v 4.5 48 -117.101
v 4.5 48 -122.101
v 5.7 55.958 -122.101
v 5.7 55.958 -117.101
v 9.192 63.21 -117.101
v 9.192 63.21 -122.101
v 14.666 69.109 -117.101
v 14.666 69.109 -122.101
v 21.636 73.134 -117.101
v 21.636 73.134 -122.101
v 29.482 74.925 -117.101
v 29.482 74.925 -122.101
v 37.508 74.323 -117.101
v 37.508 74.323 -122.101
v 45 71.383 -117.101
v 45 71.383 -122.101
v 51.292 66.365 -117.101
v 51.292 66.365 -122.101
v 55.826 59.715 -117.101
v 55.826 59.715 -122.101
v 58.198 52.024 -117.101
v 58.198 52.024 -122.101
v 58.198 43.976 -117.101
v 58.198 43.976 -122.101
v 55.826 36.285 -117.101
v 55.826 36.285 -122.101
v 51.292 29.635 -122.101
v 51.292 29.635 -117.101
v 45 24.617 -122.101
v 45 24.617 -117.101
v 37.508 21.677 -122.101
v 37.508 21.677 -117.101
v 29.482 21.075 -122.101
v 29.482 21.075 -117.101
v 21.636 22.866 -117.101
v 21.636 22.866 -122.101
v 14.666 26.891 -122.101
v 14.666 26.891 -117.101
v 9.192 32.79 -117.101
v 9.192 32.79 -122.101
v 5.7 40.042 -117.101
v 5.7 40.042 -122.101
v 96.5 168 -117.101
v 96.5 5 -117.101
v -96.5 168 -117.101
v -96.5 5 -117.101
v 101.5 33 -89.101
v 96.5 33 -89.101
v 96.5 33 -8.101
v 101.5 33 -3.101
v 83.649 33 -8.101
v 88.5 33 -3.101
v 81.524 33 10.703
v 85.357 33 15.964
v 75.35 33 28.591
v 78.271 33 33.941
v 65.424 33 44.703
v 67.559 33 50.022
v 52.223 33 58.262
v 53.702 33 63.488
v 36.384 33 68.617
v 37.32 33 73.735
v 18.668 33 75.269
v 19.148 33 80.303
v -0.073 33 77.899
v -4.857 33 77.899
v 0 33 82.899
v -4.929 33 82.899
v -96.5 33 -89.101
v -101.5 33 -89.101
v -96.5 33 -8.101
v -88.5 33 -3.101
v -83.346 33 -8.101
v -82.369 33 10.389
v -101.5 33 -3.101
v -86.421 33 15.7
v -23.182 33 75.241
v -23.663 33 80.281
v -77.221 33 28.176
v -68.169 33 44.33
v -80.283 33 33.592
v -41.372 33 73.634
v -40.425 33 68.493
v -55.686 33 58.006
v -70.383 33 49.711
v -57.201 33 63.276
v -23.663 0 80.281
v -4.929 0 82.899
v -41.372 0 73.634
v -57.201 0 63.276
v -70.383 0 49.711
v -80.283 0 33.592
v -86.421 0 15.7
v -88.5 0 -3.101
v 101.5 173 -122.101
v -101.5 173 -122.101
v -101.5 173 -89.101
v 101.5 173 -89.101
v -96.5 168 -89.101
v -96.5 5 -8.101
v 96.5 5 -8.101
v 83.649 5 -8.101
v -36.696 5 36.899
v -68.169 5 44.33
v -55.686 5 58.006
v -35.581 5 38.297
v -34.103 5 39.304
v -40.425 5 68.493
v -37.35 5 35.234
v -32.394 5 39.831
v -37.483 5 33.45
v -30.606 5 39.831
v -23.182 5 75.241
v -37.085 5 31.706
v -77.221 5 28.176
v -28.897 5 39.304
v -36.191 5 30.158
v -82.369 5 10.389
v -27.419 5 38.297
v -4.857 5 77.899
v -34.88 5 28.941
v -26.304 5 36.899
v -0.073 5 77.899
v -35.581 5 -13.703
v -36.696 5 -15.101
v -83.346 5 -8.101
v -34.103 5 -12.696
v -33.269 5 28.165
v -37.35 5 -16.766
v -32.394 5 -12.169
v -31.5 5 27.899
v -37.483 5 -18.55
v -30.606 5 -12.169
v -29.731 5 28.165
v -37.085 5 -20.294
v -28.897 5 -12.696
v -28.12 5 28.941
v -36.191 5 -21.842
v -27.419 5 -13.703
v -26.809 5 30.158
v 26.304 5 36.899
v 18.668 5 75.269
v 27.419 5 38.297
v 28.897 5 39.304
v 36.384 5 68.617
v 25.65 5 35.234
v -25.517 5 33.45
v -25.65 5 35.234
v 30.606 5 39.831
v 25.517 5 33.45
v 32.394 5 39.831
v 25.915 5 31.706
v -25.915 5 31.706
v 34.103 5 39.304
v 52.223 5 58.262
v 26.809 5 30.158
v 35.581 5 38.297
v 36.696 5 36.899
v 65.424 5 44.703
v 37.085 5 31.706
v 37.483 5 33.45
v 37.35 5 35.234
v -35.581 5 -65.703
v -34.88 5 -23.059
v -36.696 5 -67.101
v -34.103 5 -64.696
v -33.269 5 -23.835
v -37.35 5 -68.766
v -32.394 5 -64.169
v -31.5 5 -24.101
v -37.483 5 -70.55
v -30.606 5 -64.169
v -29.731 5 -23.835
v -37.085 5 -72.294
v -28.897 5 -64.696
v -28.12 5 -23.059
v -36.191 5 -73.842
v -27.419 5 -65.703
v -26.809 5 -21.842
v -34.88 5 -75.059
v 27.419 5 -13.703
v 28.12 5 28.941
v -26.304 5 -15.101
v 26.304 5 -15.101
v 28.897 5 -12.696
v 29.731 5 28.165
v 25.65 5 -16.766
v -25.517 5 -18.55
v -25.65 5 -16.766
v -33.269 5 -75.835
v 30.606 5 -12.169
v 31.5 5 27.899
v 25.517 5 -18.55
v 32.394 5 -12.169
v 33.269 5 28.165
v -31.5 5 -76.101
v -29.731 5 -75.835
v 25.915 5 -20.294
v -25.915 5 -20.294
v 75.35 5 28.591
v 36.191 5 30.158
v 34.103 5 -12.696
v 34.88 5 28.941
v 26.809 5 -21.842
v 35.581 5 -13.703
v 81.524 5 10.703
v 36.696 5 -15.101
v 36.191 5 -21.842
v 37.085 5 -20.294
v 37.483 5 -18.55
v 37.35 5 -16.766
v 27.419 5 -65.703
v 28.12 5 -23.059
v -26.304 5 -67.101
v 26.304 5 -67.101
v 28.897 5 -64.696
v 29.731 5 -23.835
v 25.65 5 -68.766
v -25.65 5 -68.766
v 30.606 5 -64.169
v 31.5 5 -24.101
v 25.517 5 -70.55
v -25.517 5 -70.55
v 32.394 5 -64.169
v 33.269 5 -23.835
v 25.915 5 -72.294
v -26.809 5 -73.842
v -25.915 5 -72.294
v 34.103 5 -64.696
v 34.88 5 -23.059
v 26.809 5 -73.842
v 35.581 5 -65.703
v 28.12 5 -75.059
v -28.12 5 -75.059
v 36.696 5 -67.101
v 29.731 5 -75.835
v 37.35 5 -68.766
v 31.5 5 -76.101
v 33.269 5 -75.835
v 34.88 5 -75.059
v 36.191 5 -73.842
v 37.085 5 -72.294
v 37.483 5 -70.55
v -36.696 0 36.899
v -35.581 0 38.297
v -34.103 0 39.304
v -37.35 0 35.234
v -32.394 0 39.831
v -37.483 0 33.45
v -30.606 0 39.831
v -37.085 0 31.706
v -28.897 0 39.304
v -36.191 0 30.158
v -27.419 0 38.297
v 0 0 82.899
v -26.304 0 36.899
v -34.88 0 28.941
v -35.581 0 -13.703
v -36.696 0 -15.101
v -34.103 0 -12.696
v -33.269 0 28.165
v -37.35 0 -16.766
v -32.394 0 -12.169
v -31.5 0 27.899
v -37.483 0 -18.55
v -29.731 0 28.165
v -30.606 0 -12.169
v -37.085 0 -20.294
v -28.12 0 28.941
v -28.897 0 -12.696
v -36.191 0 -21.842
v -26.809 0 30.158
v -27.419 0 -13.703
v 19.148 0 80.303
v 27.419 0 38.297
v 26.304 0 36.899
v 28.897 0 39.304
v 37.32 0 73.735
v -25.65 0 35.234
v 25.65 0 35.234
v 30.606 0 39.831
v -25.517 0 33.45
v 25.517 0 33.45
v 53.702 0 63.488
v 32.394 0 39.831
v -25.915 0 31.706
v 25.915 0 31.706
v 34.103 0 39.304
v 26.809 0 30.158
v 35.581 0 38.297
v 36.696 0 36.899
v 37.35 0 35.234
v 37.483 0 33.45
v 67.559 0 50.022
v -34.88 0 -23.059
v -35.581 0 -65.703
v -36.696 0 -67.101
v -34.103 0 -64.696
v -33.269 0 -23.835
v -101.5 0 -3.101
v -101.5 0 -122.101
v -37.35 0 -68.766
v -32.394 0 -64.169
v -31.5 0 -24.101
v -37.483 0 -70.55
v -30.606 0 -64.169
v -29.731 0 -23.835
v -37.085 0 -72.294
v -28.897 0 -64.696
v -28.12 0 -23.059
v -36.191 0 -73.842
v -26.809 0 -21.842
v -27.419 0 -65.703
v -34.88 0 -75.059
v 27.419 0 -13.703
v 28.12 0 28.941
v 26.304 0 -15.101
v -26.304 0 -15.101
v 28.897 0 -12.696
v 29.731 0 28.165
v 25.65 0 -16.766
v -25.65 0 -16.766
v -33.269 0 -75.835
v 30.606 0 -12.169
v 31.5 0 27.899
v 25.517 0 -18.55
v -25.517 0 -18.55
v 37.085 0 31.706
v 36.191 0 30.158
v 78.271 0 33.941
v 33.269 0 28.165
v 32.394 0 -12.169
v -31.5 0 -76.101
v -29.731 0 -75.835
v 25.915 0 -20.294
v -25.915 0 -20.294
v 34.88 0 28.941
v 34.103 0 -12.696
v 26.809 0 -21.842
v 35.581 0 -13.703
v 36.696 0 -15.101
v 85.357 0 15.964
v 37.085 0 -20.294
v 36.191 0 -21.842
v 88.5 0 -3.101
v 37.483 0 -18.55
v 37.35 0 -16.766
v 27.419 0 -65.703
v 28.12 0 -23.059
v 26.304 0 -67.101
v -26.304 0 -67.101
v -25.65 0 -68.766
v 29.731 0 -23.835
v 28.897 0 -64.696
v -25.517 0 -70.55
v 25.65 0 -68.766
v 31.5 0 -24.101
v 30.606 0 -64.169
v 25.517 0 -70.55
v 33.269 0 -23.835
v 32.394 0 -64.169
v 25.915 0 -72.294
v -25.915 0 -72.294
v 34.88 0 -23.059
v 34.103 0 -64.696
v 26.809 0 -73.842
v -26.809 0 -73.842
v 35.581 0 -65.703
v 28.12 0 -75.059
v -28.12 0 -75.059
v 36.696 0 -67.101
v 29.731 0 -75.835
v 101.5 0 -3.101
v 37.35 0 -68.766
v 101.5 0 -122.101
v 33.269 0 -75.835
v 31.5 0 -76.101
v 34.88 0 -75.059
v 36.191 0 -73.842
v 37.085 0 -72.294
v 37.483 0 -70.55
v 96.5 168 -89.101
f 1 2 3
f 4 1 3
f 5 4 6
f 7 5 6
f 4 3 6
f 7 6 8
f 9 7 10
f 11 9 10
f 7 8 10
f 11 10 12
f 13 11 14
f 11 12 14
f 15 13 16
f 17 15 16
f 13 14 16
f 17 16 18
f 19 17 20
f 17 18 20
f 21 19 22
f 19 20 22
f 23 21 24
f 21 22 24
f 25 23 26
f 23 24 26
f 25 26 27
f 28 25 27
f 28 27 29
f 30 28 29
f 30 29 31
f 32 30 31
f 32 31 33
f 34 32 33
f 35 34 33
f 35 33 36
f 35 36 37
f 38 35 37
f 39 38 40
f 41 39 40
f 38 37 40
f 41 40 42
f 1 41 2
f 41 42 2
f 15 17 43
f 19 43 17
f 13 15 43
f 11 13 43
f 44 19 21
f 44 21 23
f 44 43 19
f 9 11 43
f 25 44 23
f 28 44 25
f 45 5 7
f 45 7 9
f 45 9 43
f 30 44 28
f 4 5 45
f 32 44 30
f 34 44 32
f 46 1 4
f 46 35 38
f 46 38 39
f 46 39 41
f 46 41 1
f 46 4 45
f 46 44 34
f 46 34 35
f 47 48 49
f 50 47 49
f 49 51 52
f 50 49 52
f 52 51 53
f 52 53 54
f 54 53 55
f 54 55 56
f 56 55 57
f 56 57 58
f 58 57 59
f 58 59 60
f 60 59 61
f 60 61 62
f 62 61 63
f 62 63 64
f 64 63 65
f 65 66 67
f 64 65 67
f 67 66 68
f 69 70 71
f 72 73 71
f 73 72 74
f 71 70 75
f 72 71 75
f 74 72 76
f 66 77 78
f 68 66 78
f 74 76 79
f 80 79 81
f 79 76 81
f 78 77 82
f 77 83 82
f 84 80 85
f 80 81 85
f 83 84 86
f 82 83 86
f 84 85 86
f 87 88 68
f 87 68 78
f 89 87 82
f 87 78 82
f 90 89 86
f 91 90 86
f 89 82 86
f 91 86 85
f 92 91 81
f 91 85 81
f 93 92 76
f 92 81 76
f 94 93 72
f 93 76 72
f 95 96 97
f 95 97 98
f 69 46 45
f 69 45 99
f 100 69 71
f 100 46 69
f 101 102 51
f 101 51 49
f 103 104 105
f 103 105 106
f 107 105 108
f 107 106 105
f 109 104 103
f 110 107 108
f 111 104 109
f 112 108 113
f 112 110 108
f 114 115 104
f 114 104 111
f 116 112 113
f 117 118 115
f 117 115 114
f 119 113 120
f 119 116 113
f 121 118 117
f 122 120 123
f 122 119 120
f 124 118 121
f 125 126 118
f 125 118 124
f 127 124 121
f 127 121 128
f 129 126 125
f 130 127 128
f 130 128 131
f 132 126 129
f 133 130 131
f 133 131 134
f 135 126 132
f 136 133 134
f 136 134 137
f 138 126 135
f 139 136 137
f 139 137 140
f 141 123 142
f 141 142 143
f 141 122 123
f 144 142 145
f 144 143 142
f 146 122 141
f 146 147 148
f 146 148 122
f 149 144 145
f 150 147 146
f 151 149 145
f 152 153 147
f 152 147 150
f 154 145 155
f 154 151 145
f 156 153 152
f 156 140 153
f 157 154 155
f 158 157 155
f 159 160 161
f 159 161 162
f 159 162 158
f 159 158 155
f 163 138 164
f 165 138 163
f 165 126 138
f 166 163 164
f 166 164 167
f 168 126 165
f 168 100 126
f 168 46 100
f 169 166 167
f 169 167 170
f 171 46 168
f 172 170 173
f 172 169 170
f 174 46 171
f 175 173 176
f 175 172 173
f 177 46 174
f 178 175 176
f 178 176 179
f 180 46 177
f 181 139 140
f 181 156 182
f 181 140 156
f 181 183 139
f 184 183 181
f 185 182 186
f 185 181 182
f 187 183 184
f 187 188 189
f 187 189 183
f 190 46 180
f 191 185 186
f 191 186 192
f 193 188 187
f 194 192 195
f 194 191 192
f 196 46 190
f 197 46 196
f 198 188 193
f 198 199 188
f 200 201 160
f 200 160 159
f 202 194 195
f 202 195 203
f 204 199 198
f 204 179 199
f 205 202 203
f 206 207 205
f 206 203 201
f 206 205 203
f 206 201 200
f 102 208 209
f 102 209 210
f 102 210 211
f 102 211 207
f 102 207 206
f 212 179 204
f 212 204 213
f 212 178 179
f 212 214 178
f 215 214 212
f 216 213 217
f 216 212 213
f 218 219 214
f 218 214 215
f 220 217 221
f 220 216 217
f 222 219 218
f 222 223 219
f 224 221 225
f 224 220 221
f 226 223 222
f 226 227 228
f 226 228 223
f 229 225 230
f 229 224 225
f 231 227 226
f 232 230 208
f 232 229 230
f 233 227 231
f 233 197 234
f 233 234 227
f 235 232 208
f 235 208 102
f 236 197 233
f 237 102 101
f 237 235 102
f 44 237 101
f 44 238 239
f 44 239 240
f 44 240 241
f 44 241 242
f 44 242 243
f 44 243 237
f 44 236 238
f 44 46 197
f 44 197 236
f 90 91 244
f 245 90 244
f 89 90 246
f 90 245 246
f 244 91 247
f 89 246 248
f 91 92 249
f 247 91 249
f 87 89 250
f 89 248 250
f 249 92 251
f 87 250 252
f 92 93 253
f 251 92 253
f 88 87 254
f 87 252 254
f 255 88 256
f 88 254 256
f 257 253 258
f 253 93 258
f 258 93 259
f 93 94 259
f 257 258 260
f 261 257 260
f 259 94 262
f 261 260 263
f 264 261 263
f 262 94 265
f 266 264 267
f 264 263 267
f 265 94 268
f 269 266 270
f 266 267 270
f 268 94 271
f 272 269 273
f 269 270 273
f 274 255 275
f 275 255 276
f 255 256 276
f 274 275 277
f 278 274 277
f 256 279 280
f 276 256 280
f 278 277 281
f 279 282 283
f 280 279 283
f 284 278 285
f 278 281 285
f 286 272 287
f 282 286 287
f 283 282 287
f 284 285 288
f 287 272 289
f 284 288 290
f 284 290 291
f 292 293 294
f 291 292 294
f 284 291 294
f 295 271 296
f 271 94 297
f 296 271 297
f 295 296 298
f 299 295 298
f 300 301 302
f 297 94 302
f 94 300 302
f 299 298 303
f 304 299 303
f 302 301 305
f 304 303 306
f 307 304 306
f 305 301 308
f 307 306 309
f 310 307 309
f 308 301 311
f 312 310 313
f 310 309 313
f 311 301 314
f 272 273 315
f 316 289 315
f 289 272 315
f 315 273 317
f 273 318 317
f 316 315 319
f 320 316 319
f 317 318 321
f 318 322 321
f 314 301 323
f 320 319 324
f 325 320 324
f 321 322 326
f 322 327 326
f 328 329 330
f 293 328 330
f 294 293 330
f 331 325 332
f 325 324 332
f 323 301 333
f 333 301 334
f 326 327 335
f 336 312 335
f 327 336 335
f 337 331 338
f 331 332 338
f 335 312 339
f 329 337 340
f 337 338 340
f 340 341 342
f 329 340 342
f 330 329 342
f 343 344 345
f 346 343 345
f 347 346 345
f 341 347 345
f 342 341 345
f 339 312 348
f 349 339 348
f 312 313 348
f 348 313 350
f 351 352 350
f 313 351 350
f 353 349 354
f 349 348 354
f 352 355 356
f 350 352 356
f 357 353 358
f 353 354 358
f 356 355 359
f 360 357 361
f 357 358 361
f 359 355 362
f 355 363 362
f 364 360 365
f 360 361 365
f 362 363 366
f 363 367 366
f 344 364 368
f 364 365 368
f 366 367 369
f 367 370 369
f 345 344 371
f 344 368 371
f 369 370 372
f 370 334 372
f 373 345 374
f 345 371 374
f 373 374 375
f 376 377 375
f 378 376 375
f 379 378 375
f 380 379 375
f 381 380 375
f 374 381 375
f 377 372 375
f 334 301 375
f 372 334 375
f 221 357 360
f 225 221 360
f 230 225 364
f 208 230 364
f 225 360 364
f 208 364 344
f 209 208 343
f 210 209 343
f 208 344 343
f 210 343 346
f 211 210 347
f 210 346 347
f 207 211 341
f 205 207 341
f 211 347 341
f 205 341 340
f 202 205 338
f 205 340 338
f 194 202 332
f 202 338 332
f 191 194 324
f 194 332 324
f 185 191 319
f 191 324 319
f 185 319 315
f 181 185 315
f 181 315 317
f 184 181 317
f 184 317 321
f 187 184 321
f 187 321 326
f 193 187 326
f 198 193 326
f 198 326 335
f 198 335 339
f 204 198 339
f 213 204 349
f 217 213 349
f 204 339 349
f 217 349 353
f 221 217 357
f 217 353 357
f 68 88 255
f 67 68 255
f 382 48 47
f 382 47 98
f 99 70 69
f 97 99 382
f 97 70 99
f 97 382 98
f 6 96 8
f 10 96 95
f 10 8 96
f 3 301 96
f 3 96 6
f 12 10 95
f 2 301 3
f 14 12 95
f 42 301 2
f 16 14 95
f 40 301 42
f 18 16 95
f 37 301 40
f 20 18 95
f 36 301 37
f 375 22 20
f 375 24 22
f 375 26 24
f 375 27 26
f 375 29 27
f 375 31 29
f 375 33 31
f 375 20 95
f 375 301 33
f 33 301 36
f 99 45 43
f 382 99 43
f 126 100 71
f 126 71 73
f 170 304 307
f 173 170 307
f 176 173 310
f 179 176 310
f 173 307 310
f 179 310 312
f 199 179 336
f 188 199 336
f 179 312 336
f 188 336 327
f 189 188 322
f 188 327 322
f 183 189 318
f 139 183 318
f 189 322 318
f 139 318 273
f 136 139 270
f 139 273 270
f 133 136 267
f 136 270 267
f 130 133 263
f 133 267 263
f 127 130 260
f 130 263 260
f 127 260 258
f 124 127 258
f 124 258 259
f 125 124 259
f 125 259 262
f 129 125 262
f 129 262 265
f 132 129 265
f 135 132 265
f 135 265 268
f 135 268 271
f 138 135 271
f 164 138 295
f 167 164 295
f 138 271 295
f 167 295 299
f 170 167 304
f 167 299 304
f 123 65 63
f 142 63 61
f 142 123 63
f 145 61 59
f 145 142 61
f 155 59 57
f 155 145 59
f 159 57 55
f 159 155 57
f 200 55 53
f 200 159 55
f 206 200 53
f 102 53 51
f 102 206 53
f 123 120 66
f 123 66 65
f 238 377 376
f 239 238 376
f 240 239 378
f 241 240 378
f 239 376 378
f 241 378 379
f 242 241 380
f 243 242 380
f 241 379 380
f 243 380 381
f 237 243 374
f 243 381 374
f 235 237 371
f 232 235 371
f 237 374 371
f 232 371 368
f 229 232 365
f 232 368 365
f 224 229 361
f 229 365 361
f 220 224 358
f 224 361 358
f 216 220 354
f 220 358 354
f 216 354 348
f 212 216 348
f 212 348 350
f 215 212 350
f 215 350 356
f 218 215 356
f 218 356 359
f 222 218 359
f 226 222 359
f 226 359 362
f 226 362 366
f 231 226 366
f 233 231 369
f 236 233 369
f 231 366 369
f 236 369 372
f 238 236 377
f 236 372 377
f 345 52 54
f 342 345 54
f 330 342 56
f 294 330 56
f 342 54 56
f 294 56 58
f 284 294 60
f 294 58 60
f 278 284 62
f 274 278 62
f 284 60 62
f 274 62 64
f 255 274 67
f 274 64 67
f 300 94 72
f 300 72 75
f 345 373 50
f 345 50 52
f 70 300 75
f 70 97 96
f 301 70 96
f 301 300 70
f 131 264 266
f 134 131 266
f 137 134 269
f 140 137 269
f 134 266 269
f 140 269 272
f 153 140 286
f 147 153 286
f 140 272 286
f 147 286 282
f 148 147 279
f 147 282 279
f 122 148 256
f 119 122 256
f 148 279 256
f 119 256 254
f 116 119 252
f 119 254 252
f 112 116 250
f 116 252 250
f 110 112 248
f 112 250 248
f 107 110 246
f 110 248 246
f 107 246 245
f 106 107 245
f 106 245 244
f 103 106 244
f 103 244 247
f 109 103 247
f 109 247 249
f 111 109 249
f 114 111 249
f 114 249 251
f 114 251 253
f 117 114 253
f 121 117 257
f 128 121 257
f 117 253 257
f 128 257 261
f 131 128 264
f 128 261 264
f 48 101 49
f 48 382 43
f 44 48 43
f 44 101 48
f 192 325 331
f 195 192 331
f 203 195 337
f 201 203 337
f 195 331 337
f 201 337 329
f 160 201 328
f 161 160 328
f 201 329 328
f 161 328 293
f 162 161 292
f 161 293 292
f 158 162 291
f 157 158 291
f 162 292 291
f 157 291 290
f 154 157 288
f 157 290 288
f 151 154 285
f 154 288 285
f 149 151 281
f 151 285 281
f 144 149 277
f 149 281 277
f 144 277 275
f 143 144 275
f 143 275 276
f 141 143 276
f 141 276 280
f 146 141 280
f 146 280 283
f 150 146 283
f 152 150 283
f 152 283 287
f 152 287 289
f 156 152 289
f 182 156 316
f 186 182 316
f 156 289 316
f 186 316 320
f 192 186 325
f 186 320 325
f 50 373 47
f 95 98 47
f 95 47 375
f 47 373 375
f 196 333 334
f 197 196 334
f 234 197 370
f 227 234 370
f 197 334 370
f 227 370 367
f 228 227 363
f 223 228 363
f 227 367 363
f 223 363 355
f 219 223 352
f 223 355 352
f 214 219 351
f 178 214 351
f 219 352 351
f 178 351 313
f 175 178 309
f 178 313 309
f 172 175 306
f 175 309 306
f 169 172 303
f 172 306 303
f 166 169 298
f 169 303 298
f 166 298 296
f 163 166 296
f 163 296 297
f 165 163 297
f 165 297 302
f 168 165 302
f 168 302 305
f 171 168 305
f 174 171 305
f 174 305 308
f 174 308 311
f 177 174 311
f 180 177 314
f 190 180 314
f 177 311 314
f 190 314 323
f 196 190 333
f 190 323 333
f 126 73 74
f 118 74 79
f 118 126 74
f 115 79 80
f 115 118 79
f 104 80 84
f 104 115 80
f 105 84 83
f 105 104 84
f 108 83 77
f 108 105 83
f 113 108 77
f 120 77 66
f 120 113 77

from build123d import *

# Parameters (mm, degrees)
CROQUIS1_W              = 203
CROQUIS1_H              = 205
SALIENTE_EXTRUIR1_DEPTH = 173
CROQUIS2_W              = 172
CROQUIS2_H              = 140
CORTAR_EXTRUIR1_DEPTH   = 211
CORTAR_EXTRUIR2_DEPTH   = 33
VACIADO1_START          = 5
VACIADO1_DEPTH          = 163
CROQUIS6_R              = 27
CORTAR_EXTRUIR4_DEPTH   = 5
CROQUIS8_R              = 6
CORTAR_EXTRUIR5_DEPTH   = 5


# Read off the part's stored shape, not the designer's step: Vaciado1
with BuildPart() as part:
    # Croquis1 → Saliente-Extruir1 (new body)
    with BuildSketch(Plane(origin=(0, 0, 0), x_dir=(1, 0, 0), z_dir=(0, 1, 0))):
        with Locations((0, 19.601485149)):
            Rectangle(CROQUIS1_W, CROQUIS1_H)
    extrude(amount=SALIENTE_EXTRUIR1_DEPTH)

    # Croquis2 → Cortar-Extruir1 (cut)
    with BuildSketch(Plane.ZY.offset(101.5)):
        with Locations((-3.101485149, 103)):
            Rectangle(CROQUIS2_W, CROQUIS2_H)
    extrude(amount=-CORTAR_EXTRUIR1_DEPTH, mode=Mode.SUBTRACT)

    # Croquis3 → Cortar-Extruir2 (cut)
    with BuildSketch(Plane(origin=(0, 33, 0), x_dir=(1, 0, 0), z_dir=(0, 1, 0))):
        with BuildLine():
            Line((-101.5, 3.101485149), (-101.5, -82.898514851))
            Line((-101.5, -82.898514851), (-88.5, -82.898514851))
            Line((-88.5, -82.898514851), (-4.929378531, -82.898514851))
            ThreePointArc((-4.929378531, -82.898514851), (-64.166087143, -56.856935388), (-88.5, 3.101485149))
            Line((-88.5, 3.101485149), (-101.5, 3.101485149))
        make_face()
        with BuildLine():
            ThreePointArc((88.5, 3.101485149), (60.988030108, -57.123115602), (0, -82.898514851))
            Line((0, -82.898514851), (88.5, -82.898514851))
            Line((88.5, -82.898514851), (101.5, -82.898514851))
            Line((101.5, -82.898514851), (101.5, 3.101485149))
            Line((101.5, 3.101485149), (88.5, 3.101485149))
        make_face()
    extrude(amount=-CORTAR_EXTRUIR2_DEPTH, mode=Mode.SUBTRACT)

    # Vaciado1 outline → Vaciado1 (cut)
    with BuildSketch(Plane(origin=(0, 0, 0), x_dir=(1, 0, 0), z_dir=(0, 1, 0)).offset(VACIADO1_START)):
        with BuildLine():
            Line((-96.5, 8.101485149), (-83.345599163, 8.101485149))
            ThreePointArc((-83.345599163, 8.101485149), (-62.319461008, -51.525686528), (-4.856672926, -77.898514851))
            Line((-4.856672926, -77.898514851), (-0.072642407, -77.898514851))
            ThreePointArc((-0.072642407, -77.898514851), (59.19666813, -51.84566757), (83.649498309, 8.101485149))
            Line((83.649498309, 8.101485149), (96.5, 8.101485149))
            Line((96.5, 8.101485149), (96.5, 117.101485149))
            Line((96.5, 117.101485149), (-96.5, 117.101485149))
            Line((-96.5, 117.101485149), (-96.5, 8.101485149))
        make_face()
    extrude(amount=VACIADO1_DEPTH, mode=Mode.SUBTRACT)

    # Croquis6 → Cortar-Extruir4 (cut)
    with BuildSketch(Plane(origin=(0, 0, -122.101485149), x_dir=(-1, 0, 0), z_dir=(0, 0, -1))):
        with Locations((-31.5, 48)):
            Circle(CROQUIS6_R)
    extrude(amount=-CORTAR_EXTRUIR4_DEPTH, mode=Mode.SUBTRACT)

    # Croquis8 → Cortar-Extruir5 (cut)
    with BuildSketch(Plane.XZ):
        with Locations(Location((-31.5, -70.101485149, 0), (0, 0, 270))):
            Circle(CROQUIS8_R)
        with Locations(Location((-31.5, -18.101485149, 0), (0, 0, 270))):
            Circle(CROQUIS8_R)
        with Locations(Location((-31.5, 33.898514851, 0), (0, 0, 270))):
            Circle(CROQUIS8_R)
        with Locations(Location((31.5, -18.101485149, 0), (0, 0, 270))):
            Circle(CROQUIS8_R)
        with Locations(Location((31.5, 33.898514851, 0), (0, 0, 270))):
            Circle(CROQUIS8_R)
        with Locations(Location((31.5, -70.101485149, 0), (0, 0, 270))):
            Circle(CROQUIS8_R)
    extrude(amount=-CORTAR_EXTRUIR5_DEPTH, mode=Mode.SUBTRACT)


solid = part.part
